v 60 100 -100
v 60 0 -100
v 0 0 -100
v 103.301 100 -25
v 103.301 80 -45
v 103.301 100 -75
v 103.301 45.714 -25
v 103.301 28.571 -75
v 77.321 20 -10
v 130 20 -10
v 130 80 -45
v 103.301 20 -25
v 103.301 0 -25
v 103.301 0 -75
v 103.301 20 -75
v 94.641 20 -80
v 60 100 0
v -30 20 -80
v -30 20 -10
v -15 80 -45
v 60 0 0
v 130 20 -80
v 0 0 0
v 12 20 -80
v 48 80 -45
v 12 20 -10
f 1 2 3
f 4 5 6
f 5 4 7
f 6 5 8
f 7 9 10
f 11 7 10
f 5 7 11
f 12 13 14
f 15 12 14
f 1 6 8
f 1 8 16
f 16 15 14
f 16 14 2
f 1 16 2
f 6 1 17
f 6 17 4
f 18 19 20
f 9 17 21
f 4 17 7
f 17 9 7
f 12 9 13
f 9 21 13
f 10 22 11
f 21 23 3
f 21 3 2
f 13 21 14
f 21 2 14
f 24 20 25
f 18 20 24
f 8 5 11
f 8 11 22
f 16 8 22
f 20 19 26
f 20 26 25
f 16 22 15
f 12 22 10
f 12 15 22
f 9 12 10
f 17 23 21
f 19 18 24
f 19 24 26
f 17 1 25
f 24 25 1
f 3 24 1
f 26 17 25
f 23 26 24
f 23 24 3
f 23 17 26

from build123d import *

# Parameters (mm, degrees)
EXTRUDE1_DEPTH = 100
EXTRUDE2_DEPTH = 101
EXTRUDE3_START = -30
EXTRUDE3_DEPTH = 160
EXTRUDE4_DEPTH = 160


with BuildPart() as part:
    # Sketch1 → Extrude1 (new body)
    with BuildSketch(Plane(origin=(0, 0, 0), x_dir=(1, 0, 0), z_dir=(0, 1, 0))):
        Polygon((60, 0), (103.301270189, 25), (103.301270189, 75), (60, 100), (0, 100), (0, 0), align=None)
    extrude(amount=EXTRUDE1_DEPTH)

    # Sketch2 → Extrude2 (cut, through all)
    with BuildSketch(Plane.XY):
        Polygon((60, 100), (0, 0), (0, 100), align=None)
    extrude(amount=-EXTRUDE2_DEPTH, mode=Mode.SUBTRACT)

    # Sketch3 → Extrude3 (add)
    with BuildSketch(Plane(origin=(0, 0, 0), x_dir=(0, 0, -1), z_dir=(1, 0, 0)).offset(EXTRUDE3_START)):
        Polygon((45, 80), (80, 20), (10, 20), align=None)
    extrude(amount=EXTRUDE3_DEPTH)

    # Sketch4 → Extrude4 (cut)
    with BuildSketch(Plane.XY):
        Polygon((-30, 20), (-15, 80), (-30, 80), align=None)
    extrude(amount=-EXTRUDE4_DEPTH, mode=Mode.SUBTRACT)


solid = part.part
